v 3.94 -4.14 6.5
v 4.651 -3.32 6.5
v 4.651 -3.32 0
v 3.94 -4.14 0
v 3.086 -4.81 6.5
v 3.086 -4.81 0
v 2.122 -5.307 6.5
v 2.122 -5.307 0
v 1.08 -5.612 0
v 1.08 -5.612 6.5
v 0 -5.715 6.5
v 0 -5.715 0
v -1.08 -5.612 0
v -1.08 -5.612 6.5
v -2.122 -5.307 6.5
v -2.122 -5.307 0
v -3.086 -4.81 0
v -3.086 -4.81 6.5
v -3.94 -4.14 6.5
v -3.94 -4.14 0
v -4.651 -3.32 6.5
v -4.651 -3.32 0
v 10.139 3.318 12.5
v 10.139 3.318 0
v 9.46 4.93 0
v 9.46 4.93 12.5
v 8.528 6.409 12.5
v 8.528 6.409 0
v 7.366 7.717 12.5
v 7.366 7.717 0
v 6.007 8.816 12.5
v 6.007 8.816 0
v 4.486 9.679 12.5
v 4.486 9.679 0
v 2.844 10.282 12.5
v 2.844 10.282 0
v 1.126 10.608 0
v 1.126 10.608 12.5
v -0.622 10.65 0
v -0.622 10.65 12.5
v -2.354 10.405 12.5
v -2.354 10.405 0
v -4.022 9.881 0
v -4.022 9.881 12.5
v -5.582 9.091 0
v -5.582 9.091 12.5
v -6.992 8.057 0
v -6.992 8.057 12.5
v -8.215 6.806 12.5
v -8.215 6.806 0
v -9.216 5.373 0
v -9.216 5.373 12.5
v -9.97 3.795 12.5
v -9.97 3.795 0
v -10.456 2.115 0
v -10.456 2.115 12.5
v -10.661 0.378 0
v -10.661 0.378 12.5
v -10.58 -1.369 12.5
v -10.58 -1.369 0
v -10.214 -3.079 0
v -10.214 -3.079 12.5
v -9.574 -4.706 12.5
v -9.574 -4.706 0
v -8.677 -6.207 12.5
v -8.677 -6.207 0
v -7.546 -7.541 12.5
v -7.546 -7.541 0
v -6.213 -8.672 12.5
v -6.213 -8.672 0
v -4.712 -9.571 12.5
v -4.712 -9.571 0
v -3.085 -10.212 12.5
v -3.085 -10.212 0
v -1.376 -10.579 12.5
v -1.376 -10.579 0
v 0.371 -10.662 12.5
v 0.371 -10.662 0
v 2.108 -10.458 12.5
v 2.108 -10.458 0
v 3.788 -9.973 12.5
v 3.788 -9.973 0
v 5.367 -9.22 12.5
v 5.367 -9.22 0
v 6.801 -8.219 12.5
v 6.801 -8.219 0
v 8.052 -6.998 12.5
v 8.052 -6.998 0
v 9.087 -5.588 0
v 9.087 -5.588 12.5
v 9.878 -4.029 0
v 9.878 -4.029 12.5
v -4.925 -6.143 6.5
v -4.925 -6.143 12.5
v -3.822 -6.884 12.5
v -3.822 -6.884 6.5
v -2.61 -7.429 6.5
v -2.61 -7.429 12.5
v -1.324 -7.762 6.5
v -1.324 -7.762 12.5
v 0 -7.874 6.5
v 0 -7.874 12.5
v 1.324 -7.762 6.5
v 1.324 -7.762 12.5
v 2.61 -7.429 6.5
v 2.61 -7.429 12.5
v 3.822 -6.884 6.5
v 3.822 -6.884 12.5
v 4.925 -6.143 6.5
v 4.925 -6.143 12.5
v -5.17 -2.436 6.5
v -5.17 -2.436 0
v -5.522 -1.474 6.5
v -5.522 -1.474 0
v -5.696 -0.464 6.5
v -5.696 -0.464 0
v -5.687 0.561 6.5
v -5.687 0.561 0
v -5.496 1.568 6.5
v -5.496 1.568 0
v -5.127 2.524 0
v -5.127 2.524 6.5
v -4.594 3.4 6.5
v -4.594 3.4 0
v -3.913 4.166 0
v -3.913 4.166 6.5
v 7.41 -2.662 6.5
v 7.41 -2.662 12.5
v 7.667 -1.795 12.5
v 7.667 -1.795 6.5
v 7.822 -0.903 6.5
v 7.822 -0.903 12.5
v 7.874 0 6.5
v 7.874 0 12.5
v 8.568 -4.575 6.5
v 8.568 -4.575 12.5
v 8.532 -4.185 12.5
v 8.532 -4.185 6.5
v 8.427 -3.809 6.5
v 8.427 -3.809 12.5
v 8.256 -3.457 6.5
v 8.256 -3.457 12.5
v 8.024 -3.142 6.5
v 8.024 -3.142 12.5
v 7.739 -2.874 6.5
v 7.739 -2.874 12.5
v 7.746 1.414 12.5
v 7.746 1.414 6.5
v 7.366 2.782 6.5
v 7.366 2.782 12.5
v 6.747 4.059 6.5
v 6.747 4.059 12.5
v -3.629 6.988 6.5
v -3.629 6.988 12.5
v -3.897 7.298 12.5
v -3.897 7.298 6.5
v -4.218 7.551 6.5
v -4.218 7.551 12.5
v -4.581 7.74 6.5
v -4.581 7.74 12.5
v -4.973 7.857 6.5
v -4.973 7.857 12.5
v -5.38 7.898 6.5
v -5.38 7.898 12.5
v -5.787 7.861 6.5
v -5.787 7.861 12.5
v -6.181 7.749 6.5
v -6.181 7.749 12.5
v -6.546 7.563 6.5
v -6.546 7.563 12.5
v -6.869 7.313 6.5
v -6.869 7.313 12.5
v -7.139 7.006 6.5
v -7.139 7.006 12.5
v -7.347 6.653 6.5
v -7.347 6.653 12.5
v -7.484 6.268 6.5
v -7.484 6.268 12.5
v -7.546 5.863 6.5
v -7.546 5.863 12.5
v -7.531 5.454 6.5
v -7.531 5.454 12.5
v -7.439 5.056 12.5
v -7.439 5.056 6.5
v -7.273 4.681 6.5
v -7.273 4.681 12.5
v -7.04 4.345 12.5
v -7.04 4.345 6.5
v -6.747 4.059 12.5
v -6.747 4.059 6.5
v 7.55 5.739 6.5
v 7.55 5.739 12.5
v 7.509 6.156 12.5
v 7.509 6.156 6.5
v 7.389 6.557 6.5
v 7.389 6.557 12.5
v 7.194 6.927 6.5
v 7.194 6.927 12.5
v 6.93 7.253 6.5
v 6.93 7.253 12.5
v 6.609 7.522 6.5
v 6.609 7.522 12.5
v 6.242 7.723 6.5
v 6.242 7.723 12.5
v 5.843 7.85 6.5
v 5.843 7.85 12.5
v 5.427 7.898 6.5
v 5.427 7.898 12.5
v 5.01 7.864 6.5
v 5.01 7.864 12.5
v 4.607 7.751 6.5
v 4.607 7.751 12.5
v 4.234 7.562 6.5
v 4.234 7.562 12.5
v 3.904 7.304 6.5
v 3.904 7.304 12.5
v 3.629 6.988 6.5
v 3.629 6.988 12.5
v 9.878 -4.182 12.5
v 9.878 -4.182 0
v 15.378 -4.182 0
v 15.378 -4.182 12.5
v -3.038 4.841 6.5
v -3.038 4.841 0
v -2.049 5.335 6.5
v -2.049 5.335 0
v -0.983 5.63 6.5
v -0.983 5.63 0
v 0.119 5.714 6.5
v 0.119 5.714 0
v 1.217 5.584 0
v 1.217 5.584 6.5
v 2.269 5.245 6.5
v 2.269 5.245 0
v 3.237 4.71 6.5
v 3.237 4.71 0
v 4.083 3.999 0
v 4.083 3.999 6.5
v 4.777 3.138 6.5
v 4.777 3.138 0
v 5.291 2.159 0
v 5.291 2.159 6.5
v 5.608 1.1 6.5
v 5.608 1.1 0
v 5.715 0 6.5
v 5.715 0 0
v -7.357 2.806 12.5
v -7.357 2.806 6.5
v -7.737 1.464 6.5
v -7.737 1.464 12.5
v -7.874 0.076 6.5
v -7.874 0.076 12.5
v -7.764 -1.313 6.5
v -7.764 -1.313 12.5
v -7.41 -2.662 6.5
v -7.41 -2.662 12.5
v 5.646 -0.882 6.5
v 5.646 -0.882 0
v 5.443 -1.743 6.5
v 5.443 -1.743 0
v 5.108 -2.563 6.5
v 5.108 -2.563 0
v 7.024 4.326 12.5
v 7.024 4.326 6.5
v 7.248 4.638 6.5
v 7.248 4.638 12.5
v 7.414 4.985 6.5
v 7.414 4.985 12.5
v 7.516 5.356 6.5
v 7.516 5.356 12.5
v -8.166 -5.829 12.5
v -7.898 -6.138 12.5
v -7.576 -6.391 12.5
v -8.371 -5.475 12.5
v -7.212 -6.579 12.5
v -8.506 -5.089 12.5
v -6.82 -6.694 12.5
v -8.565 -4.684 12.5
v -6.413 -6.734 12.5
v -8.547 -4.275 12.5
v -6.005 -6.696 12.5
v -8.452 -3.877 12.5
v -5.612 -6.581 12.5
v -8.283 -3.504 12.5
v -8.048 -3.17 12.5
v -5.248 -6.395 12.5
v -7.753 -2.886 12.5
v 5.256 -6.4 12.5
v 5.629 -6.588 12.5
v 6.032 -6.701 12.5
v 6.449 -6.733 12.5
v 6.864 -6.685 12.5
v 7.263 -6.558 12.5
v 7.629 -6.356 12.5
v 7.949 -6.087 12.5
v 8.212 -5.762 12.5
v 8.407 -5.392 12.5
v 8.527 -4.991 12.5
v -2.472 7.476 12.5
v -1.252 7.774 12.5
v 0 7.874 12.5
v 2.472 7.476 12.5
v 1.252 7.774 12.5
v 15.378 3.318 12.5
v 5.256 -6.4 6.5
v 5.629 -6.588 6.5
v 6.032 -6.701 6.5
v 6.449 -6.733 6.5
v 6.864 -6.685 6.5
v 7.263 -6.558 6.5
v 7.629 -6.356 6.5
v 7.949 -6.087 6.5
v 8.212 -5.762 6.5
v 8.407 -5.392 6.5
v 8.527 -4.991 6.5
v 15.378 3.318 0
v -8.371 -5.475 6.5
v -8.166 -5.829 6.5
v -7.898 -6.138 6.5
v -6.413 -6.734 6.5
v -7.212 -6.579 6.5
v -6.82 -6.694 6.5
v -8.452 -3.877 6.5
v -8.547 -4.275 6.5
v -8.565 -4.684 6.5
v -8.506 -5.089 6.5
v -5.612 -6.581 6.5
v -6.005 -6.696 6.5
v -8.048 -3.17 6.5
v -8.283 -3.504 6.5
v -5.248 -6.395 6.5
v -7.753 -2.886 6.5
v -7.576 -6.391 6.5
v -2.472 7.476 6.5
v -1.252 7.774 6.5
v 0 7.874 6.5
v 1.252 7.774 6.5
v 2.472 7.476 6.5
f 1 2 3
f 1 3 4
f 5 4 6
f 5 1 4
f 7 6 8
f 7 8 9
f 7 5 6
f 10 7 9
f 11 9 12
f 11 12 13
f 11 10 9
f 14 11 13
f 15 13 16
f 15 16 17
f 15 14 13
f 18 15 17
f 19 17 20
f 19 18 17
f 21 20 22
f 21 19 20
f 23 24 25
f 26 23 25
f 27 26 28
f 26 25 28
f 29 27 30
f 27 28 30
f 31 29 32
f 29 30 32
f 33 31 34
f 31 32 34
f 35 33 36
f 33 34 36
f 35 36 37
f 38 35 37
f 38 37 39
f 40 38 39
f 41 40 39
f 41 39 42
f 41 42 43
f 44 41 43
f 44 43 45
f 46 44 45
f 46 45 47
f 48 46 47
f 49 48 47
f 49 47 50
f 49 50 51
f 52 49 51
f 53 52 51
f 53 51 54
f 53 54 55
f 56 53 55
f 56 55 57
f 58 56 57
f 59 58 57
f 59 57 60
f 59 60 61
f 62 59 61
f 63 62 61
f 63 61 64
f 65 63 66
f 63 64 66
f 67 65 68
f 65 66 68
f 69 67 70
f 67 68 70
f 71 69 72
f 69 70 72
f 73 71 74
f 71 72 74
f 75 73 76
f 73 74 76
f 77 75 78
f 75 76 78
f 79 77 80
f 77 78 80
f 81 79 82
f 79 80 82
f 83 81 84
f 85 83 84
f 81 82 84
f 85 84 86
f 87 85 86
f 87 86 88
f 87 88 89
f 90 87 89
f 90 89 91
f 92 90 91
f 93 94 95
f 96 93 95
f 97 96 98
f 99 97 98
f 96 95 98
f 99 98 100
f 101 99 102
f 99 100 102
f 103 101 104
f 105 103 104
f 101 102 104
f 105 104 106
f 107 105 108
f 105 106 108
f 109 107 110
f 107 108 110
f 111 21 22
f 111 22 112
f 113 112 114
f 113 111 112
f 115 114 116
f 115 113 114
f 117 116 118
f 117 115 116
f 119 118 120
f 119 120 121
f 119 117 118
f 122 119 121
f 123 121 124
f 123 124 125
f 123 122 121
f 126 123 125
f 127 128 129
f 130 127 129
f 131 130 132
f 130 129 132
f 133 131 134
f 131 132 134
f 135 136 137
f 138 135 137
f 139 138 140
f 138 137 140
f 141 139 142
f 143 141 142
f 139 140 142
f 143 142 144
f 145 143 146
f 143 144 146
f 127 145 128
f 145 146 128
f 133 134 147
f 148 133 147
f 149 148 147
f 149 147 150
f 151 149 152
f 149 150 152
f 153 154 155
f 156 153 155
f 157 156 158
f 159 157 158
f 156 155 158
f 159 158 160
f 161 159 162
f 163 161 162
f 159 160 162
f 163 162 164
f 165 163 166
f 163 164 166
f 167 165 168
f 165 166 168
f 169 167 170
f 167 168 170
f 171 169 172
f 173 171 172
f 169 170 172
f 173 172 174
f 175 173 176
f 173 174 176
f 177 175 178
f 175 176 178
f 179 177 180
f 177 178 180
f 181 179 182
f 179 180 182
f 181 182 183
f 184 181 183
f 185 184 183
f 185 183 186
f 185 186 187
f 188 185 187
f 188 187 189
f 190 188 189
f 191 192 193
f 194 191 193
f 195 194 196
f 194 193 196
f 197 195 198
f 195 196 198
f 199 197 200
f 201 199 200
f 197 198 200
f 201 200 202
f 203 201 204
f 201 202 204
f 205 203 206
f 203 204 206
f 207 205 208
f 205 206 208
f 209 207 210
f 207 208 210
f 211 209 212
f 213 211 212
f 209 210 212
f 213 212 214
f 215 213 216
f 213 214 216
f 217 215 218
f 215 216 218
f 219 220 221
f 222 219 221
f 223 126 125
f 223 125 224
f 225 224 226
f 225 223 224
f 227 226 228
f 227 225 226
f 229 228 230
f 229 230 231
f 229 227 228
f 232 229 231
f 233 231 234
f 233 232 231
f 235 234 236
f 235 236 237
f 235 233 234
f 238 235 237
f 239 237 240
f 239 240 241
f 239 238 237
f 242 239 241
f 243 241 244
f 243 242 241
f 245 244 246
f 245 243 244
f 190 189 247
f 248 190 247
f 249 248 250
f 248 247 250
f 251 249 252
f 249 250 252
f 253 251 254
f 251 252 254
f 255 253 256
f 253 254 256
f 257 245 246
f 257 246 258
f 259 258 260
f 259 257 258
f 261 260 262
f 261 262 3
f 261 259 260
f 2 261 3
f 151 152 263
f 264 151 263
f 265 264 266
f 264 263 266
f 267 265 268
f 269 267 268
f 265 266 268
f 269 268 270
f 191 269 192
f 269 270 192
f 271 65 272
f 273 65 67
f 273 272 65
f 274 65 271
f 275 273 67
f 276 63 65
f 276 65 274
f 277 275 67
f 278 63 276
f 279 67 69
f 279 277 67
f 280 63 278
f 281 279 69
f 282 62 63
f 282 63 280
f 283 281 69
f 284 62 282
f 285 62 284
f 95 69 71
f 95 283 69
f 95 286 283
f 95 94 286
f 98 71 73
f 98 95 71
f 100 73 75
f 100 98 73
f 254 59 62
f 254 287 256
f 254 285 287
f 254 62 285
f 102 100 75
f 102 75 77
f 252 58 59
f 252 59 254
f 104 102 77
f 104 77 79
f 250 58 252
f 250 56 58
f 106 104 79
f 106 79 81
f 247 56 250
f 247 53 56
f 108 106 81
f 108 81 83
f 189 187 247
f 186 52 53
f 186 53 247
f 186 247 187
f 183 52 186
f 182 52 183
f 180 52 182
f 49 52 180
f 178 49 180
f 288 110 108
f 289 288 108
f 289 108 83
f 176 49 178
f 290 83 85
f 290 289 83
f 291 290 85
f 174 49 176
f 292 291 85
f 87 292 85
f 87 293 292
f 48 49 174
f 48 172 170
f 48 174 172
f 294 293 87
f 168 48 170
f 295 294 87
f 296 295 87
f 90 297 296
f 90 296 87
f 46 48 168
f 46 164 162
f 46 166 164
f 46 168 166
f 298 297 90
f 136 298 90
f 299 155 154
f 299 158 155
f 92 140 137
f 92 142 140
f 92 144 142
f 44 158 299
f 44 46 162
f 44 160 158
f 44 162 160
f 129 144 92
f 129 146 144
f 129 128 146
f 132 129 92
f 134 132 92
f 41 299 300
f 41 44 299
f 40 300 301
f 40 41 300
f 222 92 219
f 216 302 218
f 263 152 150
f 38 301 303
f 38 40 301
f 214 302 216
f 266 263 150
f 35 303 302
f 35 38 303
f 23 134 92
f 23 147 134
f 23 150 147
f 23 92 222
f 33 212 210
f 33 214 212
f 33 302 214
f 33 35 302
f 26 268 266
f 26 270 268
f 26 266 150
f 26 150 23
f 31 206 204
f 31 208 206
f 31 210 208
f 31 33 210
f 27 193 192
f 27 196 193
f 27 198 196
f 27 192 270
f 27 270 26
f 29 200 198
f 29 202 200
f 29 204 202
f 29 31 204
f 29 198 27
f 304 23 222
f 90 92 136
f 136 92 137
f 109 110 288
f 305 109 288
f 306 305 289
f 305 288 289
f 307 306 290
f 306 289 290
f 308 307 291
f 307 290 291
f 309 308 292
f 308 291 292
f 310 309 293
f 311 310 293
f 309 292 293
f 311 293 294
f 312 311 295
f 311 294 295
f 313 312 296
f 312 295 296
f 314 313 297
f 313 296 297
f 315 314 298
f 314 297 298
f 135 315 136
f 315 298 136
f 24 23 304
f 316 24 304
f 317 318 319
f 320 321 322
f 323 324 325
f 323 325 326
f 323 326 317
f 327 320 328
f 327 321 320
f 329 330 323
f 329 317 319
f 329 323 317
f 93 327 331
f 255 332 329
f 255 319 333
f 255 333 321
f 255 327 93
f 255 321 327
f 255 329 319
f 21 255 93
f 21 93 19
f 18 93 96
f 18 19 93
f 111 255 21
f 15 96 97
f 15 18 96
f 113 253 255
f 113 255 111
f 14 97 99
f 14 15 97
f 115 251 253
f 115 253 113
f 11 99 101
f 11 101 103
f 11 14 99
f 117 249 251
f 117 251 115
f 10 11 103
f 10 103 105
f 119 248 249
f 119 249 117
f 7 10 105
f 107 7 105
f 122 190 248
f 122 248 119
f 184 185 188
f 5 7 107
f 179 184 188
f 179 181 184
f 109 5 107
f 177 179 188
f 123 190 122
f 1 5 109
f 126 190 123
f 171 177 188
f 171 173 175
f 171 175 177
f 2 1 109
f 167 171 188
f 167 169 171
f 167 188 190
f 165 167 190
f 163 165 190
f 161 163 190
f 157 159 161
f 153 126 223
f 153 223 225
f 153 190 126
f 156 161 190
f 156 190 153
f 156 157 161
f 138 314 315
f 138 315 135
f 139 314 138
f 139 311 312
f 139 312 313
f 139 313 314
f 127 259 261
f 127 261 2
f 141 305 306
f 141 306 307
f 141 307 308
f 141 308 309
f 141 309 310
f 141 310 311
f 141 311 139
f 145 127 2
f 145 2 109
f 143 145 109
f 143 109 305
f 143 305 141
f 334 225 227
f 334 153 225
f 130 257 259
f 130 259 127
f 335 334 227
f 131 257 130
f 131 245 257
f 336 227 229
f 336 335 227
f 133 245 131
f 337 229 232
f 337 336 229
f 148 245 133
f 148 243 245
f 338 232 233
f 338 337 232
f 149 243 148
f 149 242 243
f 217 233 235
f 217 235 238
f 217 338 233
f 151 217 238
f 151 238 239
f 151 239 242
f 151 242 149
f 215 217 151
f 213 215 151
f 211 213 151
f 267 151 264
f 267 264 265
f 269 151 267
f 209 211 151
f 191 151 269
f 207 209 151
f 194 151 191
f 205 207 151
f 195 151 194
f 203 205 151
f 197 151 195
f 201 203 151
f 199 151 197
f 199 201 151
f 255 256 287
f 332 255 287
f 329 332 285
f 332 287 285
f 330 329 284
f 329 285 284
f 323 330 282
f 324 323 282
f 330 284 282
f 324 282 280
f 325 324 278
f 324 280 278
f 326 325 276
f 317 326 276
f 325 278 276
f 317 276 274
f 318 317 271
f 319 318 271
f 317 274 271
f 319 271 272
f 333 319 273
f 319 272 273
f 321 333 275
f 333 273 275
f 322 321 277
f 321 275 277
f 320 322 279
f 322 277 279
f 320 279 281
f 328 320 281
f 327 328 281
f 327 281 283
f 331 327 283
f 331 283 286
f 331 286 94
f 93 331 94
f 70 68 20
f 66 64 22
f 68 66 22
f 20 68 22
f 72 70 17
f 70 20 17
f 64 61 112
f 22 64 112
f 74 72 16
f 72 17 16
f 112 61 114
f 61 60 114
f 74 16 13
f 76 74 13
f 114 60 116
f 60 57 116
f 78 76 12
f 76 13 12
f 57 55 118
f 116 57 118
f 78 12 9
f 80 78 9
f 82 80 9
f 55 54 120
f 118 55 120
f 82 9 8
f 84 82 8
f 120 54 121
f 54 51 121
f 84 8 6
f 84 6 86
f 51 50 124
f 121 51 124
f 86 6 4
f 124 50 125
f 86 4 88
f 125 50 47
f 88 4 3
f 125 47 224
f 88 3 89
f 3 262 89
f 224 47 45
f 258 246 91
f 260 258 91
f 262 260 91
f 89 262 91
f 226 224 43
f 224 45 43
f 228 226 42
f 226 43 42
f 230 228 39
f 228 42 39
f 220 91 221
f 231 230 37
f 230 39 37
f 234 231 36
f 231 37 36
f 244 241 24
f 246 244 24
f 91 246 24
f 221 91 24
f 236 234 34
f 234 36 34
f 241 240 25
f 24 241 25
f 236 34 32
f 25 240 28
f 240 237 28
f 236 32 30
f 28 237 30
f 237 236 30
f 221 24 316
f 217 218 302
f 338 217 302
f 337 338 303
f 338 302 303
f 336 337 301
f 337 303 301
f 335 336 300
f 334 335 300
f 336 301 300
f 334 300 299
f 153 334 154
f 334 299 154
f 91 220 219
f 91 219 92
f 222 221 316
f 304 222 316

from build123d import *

# Parameters (mm, degrees)
F0_R     = 10.668
F1_DEPTH = 12.5
F3_DEPTH = 6
F4_DEPTH = 12.5
F5_W     = 5.5
F5_H     = 7.5
F6_DEPTH = 12.5


with BuildPart() as f1:
    # F0 (on Top) → F1 (new body)
    with BuildSketch(Plane.XY):
        Circle(F0_R)
    extrude(amount=F1_DEPTH)

    # F2 (on face) → F3 (cut)
    with BuildSketch(Plane.XY.offset(12.5)):
        with BuildLine():
            ThreePointArc((7.4103049922, -2.6621900614), (7.7572101141, -1.3511355394), (7.874, 0))
            ThreePointArc((7.874, 0), (7.5870287926, 2.1063879275), (6.7470327404, 4.0592394854))
            ThreePointArc((6.7470327404, 4.0592394854), (5.3099885026, 3.5816895419), (3.9127477219, 4.1655288097))
            ThreePointArc((3.9127477219, 4.1655288097), (5.2451205053, 2.2693470172), (5.715, 0))
            ThreePointArc((5.715, 0), (5.4426248431, -1.7432899407), (4.6514620061, -3.3204105477))
            ThreePointArc((4.6514620061, -3.3204105477), (5.9076375819, -2.4747315537), (7.4103049922, -2.6621900614))
        make_face()
        with BuildLine():
            ThreePointArc((3.9127477219, 4.1655288097), (5.3099885026, 3.5816895419), (6.7470327404, 4.0592394854))
            ThreePointArc((6.7470327404, 4.0592394854), (5.3908968998, 5.7391729906), (3.6294620987, 6.9876234067))
            ThreePointArc((3.6294620987, 6.9876234067), (3.2426928667, 5.5235334018), (3.9127477219, 4.1655288097))
        make_face()
        with BuildLine():
            ThreePointArc((3.6294620987, 6.9876234067), (5.3908968998, 5.7391729906), (6.7470327404, 4.0592394854))
            ThreePointArc((6.7470327404, 4.0592394854), (7.3388674181, 4.8082101234), (7.5498968998, 5.7391729906))
            ThreePointArc((7.5498968998, 5.7391729906), (6.0460088233, 7.7963821116), (3.6294620987, 6.9876234067))
        make_face()
        with BuildLine():
            ThreePointArc((8.5676809877, -4.5747878637), (8.2558121722, -3.4570278774), (7.4103049922, -2.6621900614))
            ThreePointArc((7.4103049922, -2.6621900614), (6.4086809877, -4.5747878637), (4.9252388756, -6.1434434984))
            ThreePointArc((4.9252388756, -6.1434434984), (7.2626509755, -6.557719093), (8.5676809877, -4.5747878637))
        make_face()
        with BuildLine():
            ThreePointArc((4.9252388756, -6.1434434984), (6.4086809877, -4.5747878637), (7.4103049922, -2.6621900614))
            ThreePointArc((7.4103049922, -2.6621900614), (5.9076375819, -2.4747315537), (4.6514620061, -3.3204105477))
            ThreePointArc((4.6514620061, -3.3204105477), (4.2597626921, -4.7831893008), (4.9252388756, -6.1434434984))
        make_face()
        with BuildLine():
            ThreePointArc((3.9127477219, 4.1655288097), (3.2426928667, 5.5235334018), (3.6294620987, 6.9876234067))
            ThreePointArc((3.6294620987, 6.9876234067), (0, 7.874), (-3.6294620987, 6.9876234067))
            ThreePointArc((-3.6294620987, 6.9876234067), (-3.3336877788, 6.394284914), (-3.2318968998, 5.7391729906))
            ThreePointArc((-3.2318968998, 5.7391729906), (-3.4094069377, 4.8818641023), (-3.9127477844, 4.165528751))
            ThreePointArc((-3.9127477844, 4.165528751), (-4.29e-08, 5.715), (3.9127477219, 4.1655288097))
        make_face()
        with BuildLine():
            ThreePointArc((-4.9252388756, -6.1434434984), (0, -7.874), (4.9252388756, -6.1434434984))
            ThreePointArc((4.9252388756, -6.1434434984), (4.2597626921, -4.7831893008), (4.6514620061, -3.3204105477))
            ThreePointArc((4.6514620061, -3.3204105477), (6.6e-09, -5.715), (-4.6514619984, -3.3204105585))
            ThreePointArc((-4.6514619984, -3.3204105585), (-4.3525782668, -3.9162116714), (-4.2496809877, -4.5747878637))
            ThreePointArc((-4.2496809877, -4.5747878637), (-4.4257497584, -5.4287578515), (-4.9252388756, -6.1434434984))
        make_face()
        with BuildLine():
            ThreePointArc((-3.2318968998, 5.7391729906), (-3.3336877788, 6.394284914), (-3.6294620987, 6.9876234067))
            ThreePointArc((-3.6294620987, 6.9876234067), (-5.3908968998, 5.7391729906), (-6.7470327404, 4.0592394854))
            ThreePointArc((-6.7470327404, 4.0592394854), (-5.3099885454, 3.5816895403), (-3.9127477844, 4.165528751))
            ThreePointArc((-3.9127477844, 4.165528751), (-3.4094069377, 4.8818641023), (-3.2318968998, 5.7391729906))
        make_face()
        with BuildLine():
            ThreePointArc((-6.7470327404, 4.0592394854), (-5.3908968998, 5.7391729906), (-3.6294620987, 6.9876234067))
            ThreePointArc((-3.6294620987, 6.9876234067), (-6.8690460498, 7.3128171977), (-6.7470327404, 4.0592394854))
        make_face()
        with BuildLine():
            ThreePointArc((-4.6514619984, -3.3204105585), (-5.6873758569, 0.5612315586), (-3.9127477844, 4.165528751))
            ThreePointArc((-3.9127477844, 4.165528751), (-5.3099885454, 3.5816895403), (-6.7470327404, 4.0592394854))
            ThreePointArc((-6.7470327404, 4.0592394854), (-7.8359400653, 0.7732524124), (-7.4103049922, -2.6621900614))
            ThreePointArc((-7.4103049922, -2.6621900614), (-5.9076375754, -2.4747315552), (-4.6514619984, -3.3204105585))
        make_face()
        with BuildLine():
            ThreePointArc((-7.4103049922, -2.6621900614), (-8.1658999682, -5.8291651812), (-4.9252388756, -6.1434434984))
            ThreePointArc((-4.9252388756, -6.1434434984), (-6.4086809877, -4.5747878637), (-7.4103049922, -2.6621900614))
        make_face()
        with BuildLine():
            ThreePointArc((-7.4103049922, -2.6621900614), (-6.4086809877, -4.5747878637), (-4.9252388756, -6.1434434984))
            ThreePointArc((-4.9252388756, -6.1434434984), (-4.4257497584, -5.4287578515), (-4.2496809877, -4.5747878637))
            ThreePointArc((-4.2496809877, -4.5747878637), (-4.3525782668, -3.9162116714), (-4.6514619984, -3.3204105585))
            ThreePointArc((-4.6514619984, -3.3204105585), (-5.9076375754, -2.4747315552), (-7.4103049922, -2.6621900614))
        make_face()
    extrude(amount=-F3_DEPTH, mode=Mode.SUBTRACT)

    # F4 (cut): a face of the model
    f4_faces = [f1.faces().sort_by_distance(p)[0] for p in [
        (0, 0, 12.5),
    ]]
    extrude(f4_faces, amount=-F4_DEPTH, mode=Mode.SUBTRACT)

    # F5 (on Top) → F6 (join)
    with BuildSketch(Plane.XY):
        with Locations((12.6280929255, -0.4317085259)):
            Rectangle(F5_W, F5_H)
    extrude(amount=F6_DEPTH)


solid = f1.part
